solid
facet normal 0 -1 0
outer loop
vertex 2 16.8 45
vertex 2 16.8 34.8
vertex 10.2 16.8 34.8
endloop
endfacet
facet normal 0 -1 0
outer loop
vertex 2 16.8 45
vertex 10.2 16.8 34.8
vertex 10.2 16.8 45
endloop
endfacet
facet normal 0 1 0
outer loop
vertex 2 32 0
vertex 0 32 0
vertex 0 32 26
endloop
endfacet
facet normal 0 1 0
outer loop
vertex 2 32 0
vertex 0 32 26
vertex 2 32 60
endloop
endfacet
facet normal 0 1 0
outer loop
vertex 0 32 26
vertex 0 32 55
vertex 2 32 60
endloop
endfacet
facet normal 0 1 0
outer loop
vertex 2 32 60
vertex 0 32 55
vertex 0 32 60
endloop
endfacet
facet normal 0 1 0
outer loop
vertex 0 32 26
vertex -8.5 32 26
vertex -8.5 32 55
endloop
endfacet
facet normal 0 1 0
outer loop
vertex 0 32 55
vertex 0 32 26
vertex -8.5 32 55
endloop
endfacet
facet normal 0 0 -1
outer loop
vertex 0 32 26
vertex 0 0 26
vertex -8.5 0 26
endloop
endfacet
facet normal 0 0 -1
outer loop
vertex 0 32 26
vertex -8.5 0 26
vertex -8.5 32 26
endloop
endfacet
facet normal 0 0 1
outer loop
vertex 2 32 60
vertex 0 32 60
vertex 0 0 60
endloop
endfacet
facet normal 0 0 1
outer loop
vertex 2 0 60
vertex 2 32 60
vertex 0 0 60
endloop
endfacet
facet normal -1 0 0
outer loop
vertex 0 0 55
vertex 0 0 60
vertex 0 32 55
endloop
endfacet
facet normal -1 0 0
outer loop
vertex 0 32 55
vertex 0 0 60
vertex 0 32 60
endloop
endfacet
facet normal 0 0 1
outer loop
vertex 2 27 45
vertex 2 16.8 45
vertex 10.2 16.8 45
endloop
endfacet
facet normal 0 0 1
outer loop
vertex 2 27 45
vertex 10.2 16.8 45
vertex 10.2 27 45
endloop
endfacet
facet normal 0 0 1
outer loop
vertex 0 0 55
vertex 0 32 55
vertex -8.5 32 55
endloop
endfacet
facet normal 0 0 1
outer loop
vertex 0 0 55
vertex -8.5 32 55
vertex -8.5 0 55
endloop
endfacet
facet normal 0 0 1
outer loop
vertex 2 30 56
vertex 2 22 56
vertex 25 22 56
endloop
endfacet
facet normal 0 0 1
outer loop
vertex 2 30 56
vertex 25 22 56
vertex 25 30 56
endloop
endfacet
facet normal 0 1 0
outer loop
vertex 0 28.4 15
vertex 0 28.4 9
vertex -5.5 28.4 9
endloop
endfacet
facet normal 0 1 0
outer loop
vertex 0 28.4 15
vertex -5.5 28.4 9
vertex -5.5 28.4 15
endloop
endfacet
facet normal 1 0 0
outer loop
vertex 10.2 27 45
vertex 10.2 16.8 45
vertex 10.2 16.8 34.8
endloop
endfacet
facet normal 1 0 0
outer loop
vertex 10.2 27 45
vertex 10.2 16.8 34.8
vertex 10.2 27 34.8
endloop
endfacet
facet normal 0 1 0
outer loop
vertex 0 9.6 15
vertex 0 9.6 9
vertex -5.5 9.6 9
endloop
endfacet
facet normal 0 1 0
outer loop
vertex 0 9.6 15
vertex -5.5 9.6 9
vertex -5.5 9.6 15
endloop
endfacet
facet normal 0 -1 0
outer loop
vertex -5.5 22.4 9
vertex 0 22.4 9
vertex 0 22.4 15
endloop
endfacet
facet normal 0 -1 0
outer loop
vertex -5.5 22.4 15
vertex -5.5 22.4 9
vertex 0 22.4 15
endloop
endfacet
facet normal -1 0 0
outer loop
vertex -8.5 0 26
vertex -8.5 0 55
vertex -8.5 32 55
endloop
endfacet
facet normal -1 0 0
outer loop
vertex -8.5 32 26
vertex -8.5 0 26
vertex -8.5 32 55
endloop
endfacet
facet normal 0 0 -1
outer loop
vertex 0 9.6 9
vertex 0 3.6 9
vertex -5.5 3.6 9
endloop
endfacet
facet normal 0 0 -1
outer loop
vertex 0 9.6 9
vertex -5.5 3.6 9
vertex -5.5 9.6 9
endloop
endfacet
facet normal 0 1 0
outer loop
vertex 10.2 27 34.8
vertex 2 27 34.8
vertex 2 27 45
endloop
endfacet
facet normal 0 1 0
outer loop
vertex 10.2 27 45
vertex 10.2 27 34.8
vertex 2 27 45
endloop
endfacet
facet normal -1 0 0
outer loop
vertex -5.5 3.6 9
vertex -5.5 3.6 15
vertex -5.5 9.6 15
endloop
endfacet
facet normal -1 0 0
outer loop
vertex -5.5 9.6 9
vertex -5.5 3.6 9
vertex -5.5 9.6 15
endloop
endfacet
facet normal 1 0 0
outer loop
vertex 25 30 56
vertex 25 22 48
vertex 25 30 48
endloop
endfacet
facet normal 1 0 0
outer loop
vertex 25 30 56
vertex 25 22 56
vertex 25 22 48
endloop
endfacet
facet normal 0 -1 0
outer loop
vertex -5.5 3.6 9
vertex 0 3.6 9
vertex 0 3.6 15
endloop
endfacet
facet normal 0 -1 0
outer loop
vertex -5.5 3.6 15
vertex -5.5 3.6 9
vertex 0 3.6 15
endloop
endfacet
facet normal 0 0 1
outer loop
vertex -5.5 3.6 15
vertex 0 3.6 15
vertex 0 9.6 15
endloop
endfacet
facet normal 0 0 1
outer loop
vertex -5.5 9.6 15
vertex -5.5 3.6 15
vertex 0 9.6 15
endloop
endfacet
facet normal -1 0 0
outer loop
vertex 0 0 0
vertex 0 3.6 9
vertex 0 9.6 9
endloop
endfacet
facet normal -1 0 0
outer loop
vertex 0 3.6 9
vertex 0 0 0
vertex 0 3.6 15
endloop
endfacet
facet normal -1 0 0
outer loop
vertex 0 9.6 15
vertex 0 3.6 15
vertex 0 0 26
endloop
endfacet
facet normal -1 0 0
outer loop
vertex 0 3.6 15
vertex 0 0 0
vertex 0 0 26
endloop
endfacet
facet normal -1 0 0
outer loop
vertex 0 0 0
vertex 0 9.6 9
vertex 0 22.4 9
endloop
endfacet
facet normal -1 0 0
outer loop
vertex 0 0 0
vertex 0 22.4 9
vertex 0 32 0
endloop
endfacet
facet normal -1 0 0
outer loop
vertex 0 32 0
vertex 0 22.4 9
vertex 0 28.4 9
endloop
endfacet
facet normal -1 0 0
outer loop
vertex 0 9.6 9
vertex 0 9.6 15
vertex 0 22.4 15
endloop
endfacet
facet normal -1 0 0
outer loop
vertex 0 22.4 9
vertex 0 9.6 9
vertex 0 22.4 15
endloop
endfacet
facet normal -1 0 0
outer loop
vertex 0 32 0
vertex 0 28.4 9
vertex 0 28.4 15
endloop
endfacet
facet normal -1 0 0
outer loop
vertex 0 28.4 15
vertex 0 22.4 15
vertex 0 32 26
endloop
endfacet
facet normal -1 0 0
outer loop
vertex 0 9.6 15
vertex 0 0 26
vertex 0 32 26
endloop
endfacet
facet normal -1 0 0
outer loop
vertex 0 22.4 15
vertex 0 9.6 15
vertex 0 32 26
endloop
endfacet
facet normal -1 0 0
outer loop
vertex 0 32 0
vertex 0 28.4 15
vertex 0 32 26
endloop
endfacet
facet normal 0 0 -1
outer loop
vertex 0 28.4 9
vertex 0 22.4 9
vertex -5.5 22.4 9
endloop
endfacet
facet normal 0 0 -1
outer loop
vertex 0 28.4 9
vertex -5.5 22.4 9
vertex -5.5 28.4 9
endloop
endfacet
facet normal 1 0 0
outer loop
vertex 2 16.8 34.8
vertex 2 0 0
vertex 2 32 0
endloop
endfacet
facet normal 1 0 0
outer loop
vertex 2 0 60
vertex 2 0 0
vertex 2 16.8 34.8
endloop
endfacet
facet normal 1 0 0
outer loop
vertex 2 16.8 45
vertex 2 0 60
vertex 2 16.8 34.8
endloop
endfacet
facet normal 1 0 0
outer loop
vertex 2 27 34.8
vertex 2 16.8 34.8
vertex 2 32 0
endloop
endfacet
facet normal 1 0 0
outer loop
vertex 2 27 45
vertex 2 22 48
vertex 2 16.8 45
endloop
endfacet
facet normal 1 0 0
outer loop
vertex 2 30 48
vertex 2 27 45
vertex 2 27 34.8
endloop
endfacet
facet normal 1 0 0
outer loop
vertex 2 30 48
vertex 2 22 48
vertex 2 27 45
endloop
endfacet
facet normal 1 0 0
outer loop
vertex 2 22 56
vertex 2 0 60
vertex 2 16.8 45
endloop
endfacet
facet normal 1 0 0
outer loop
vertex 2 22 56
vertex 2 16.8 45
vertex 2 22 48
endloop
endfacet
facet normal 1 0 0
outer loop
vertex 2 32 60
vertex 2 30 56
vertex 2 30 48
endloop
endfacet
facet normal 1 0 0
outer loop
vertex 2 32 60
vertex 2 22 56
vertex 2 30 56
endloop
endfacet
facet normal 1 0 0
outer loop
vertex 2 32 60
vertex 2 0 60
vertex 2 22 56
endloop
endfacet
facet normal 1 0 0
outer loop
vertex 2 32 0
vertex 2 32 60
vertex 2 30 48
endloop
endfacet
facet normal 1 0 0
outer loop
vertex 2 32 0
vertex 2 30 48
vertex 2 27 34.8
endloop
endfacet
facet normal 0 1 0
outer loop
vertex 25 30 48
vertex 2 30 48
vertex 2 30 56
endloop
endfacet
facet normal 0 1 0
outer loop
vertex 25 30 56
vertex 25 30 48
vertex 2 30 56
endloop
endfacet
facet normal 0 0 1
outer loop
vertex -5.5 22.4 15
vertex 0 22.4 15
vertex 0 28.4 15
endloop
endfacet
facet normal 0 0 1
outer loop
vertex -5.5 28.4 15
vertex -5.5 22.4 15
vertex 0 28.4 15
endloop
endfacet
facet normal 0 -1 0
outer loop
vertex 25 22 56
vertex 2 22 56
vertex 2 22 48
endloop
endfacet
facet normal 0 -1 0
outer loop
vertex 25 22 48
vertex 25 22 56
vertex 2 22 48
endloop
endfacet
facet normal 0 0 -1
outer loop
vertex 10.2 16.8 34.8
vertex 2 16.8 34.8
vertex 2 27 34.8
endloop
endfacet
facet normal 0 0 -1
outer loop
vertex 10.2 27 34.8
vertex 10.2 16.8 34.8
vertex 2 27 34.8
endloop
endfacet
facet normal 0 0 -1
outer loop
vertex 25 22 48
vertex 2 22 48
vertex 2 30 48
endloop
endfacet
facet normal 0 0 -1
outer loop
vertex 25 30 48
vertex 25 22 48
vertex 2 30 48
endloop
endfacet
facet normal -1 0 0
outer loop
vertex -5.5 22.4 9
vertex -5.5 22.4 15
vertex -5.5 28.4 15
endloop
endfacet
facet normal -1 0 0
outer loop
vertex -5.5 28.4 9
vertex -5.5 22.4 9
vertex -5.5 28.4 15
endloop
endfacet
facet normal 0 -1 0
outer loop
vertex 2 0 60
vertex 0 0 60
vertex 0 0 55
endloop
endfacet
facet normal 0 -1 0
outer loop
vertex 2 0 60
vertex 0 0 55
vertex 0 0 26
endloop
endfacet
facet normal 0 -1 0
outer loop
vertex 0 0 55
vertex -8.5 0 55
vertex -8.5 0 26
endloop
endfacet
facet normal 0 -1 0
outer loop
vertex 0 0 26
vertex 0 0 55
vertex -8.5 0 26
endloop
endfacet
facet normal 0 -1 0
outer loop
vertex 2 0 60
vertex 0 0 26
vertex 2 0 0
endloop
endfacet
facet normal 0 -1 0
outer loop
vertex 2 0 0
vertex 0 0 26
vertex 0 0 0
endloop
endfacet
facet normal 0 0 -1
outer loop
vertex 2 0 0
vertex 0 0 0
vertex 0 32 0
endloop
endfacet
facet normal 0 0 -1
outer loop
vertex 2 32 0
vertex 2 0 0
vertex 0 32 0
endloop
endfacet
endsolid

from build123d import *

# Parameters (mm, degrees)
F0_W     = 10.2
F0_H     = 10.2
F0_W_2   = 32
F0_H_2   = 26
F0_W_3   = 6
F0_H_3   = 6
F0_W_4   = 8
F0_H_4   = 7
F0_H_5   = 1
F1_DEPTH = 2
F2_DEPTH = 8.5
F3_DEPTH = 10.2
F4_DEPTH = 25
F6_DEPTH = 5.5


with BuildPart() as f1:
    # F0 (on Right) → F1 (new body)
    with BuildSketch(Plane.YZ):
        Polygon((0, 55), (0, 26), (32, 26), (32, 55), (30, 55), (30, 48), (22, 48), (22, 55), align=None)
        with Locations((21.9, 39.9)):
            Rectangle(F0_W, F0_H, mode=Mode.SUBTRACT)
        with Locations((16, 13)):
            Rectangle(F0_W_2, F0_H_2)
        with Locations((6.6, 12)):
            Rectangle(F0_W_3, F0_H_3, mode=Mode.SUBTRACT)
        with Locations((25.4, 12)):
            Rectangle(F0_W_3, F0_H_3, mode=Mode.SUBTRACT)
        Polygon((0, 60), (0, 55), (22, 55), (22, 56), (30, 56), (30, 55), (32, 55), (32, 60), align=None)
        with Locations((21.9, 39.9)):
            Rectangle(F0_W, F0_H)
        with Locations((26, 51.5)):
            Rectangle(F0_W_4, F0_H_4)
        with Locations((25.4, 12)):
            Rectangle(F0_W_3, F0_H_3)
        with Locations((6.6, 12)):
            Rectangle(F0_W_3, F0_H_3)
        with Locations((26, 55.5)):
            Rectangle(F0_W_4, F0_H_5)
    extrude(amount=F1_DEPTH)

    # F0 (on Right) → F2 (join)
    with BuildSketch(Plane.YZ):
        Polygon((0, 55), (0, 26), (32, 26), (32, 55), (30, 55), (30, 48), (22, 48), (22, 55), align=None)
        with Locations((21.9, 39.9)):
            Rectangle(F0_W, F0_H, mode=Mode.SUBTRACT)
        with Locations((26, 51.5)):
            Rectangle(F0_W_4, F0_H_4)
        with Locations((21.9, 39.9)):
            Rectangle(F0_W, F0_H)
    extrude(amount=-F2_DEPTH)

    # F0 (on Right) → F4 (join)
    with BuildSketch(Plane.YZ):
        with Locations((26, 51.5)):
            Rectangle(F0_W_4, F0_H_4)
        with Locations((26, 55.5)):
            Rectangle(F0_W_4, F0_H_5)
    extrude(amount=F4_DEPTH)


with BuildPart() as f3:
    # F0 (on Right) → F3 (new body)
    with BuildSketch(Plane.YZ):
        with Locations((21.9, 39.9)):
            Rectangle(F0_W, F0_H)
    extrude(amount=F3_DEPTH)

    # F5: union F1
    add(f1.part)

    # F0 (on Right) → F6 (join)
    with BuildSketch(Plane.YZ):
        with Locations((6.6, 12)):
            Rectangle(F0_W_3, F0_H_3)
        with Locations((25.4, 12)):
            Rectangle(F0_W_3, F0_H_3)
    extrude(amount=-F6_DEPTH)


solid = f3.part
